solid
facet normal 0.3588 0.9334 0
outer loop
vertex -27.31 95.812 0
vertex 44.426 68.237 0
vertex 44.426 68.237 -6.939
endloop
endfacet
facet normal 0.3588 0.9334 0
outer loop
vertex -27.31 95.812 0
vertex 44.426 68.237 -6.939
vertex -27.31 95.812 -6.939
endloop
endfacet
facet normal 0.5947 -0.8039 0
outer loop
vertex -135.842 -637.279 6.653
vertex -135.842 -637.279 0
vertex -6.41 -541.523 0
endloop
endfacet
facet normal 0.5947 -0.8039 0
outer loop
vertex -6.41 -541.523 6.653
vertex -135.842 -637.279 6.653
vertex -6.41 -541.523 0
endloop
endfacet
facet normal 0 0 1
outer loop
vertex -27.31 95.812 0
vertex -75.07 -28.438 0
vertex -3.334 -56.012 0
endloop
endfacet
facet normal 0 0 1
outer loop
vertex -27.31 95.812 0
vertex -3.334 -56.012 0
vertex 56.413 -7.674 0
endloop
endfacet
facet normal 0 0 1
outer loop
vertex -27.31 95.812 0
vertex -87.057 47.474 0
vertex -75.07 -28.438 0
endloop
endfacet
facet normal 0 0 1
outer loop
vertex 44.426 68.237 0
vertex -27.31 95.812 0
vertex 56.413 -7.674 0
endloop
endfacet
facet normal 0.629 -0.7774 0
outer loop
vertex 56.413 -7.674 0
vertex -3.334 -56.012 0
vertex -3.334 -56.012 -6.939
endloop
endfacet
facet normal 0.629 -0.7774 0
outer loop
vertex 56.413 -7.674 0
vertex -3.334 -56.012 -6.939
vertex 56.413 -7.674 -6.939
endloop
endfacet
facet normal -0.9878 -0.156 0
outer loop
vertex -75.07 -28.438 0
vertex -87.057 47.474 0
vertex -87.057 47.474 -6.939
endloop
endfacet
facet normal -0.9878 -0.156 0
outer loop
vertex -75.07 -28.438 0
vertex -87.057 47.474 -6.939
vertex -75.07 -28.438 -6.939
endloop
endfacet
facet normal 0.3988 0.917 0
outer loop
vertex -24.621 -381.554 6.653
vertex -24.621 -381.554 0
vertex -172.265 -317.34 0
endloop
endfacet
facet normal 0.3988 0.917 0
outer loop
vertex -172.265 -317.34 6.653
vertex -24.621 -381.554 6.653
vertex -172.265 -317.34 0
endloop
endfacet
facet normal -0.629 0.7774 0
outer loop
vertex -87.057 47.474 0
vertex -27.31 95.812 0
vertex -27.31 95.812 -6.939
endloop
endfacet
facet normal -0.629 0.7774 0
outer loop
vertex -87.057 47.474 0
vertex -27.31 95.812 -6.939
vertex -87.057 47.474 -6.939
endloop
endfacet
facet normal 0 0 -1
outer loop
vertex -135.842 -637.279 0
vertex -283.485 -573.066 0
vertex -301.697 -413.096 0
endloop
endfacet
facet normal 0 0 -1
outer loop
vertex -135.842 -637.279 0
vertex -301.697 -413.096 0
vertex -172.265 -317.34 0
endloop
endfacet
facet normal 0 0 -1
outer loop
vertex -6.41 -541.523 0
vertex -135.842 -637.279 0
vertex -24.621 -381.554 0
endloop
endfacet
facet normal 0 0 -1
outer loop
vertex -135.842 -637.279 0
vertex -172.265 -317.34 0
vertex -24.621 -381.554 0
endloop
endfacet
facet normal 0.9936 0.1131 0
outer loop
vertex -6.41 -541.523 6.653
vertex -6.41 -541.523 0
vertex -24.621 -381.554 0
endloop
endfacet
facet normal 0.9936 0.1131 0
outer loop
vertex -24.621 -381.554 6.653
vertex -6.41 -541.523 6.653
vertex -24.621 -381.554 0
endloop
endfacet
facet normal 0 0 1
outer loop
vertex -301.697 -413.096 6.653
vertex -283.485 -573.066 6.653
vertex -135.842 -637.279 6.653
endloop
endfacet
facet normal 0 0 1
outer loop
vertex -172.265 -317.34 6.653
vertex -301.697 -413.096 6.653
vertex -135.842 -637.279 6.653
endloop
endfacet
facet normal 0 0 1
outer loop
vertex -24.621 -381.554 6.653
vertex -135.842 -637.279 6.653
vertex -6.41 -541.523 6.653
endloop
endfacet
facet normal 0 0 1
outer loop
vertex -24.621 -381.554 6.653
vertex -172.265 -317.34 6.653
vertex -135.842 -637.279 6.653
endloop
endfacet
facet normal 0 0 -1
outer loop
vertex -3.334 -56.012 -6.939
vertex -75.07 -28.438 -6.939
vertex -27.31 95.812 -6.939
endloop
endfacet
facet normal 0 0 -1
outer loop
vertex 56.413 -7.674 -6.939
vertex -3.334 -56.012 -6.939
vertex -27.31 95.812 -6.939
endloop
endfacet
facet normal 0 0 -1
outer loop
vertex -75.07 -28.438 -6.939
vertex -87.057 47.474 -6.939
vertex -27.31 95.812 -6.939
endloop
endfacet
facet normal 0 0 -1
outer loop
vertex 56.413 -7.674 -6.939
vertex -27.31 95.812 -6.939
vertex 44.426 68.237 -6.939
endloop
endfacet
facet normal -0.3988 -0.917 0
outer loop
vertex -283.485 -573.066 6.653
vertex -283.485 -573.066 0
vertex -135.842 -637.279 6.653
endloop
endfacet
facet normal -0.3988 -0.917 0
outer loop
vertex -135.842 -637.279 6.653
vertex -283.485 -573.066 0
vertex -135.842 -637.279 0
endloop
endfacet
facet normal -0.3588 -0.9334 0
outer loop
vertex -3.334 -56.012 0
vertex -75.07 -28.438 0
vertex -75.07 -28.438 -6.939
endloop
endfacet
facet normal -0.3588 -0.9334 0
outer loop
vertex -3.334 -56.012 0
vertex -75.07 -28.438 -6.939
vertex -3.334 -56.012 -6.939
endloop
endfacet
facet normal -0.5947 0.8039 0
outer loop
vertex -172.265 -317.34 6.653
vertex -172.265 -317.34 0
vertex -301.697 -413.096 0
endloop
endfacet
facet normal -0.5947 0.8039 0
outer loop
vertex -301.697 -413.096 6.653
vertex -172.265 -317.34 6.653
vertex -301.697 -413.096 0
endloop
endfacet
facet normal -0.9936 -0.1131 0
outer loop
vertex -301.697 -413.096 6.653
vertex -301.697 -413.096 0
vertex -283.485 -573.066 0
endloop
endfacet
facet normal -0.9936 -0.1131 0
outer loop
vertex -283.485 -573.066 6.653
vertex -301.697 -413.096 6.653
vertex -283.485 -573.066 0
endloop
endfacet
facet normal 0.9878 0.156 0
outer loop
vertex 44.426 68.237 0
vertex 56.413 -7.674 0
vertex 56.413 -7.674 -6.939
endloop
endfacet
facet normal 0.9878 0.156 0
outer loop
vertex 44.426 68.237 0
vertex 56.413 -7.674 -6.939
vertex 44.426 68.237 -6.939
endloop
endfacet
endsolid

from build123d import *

# Parameters (mm, degrees)
F2_DEPTH = 6.939414
F4_DEPTH = 6.652863


with BuildPart() as f2:
    # F1 (on face) → F2 (new body)
    with BuildSketch(Plane.XY):
        Polygon((-75.069732, -28.437607), (-3.334372, -56.011856), (56.413308, -7.674336), (44.425628, 68.237432), (-27.309732, 95.81168), (-87.057412, 47.474161), align=None)
    extrude(amount=-F2_DEPTH)


with BuildPart() as f4:
    # F3 (on Top) → F4 (new body)
    with BuildSketch(Plane.XY):
        Polygon((-135.842279, -637.279237), (-6.410269, -541.523166), (-24.621455, -381.553721), (-172.264651, -317.340349), (-301.69666, -413.096421), (-283.485474, -573.065865), align=None)
    extrude(amount=F4_DEPTH)


solid = Compound([f2.part, f4.part])
